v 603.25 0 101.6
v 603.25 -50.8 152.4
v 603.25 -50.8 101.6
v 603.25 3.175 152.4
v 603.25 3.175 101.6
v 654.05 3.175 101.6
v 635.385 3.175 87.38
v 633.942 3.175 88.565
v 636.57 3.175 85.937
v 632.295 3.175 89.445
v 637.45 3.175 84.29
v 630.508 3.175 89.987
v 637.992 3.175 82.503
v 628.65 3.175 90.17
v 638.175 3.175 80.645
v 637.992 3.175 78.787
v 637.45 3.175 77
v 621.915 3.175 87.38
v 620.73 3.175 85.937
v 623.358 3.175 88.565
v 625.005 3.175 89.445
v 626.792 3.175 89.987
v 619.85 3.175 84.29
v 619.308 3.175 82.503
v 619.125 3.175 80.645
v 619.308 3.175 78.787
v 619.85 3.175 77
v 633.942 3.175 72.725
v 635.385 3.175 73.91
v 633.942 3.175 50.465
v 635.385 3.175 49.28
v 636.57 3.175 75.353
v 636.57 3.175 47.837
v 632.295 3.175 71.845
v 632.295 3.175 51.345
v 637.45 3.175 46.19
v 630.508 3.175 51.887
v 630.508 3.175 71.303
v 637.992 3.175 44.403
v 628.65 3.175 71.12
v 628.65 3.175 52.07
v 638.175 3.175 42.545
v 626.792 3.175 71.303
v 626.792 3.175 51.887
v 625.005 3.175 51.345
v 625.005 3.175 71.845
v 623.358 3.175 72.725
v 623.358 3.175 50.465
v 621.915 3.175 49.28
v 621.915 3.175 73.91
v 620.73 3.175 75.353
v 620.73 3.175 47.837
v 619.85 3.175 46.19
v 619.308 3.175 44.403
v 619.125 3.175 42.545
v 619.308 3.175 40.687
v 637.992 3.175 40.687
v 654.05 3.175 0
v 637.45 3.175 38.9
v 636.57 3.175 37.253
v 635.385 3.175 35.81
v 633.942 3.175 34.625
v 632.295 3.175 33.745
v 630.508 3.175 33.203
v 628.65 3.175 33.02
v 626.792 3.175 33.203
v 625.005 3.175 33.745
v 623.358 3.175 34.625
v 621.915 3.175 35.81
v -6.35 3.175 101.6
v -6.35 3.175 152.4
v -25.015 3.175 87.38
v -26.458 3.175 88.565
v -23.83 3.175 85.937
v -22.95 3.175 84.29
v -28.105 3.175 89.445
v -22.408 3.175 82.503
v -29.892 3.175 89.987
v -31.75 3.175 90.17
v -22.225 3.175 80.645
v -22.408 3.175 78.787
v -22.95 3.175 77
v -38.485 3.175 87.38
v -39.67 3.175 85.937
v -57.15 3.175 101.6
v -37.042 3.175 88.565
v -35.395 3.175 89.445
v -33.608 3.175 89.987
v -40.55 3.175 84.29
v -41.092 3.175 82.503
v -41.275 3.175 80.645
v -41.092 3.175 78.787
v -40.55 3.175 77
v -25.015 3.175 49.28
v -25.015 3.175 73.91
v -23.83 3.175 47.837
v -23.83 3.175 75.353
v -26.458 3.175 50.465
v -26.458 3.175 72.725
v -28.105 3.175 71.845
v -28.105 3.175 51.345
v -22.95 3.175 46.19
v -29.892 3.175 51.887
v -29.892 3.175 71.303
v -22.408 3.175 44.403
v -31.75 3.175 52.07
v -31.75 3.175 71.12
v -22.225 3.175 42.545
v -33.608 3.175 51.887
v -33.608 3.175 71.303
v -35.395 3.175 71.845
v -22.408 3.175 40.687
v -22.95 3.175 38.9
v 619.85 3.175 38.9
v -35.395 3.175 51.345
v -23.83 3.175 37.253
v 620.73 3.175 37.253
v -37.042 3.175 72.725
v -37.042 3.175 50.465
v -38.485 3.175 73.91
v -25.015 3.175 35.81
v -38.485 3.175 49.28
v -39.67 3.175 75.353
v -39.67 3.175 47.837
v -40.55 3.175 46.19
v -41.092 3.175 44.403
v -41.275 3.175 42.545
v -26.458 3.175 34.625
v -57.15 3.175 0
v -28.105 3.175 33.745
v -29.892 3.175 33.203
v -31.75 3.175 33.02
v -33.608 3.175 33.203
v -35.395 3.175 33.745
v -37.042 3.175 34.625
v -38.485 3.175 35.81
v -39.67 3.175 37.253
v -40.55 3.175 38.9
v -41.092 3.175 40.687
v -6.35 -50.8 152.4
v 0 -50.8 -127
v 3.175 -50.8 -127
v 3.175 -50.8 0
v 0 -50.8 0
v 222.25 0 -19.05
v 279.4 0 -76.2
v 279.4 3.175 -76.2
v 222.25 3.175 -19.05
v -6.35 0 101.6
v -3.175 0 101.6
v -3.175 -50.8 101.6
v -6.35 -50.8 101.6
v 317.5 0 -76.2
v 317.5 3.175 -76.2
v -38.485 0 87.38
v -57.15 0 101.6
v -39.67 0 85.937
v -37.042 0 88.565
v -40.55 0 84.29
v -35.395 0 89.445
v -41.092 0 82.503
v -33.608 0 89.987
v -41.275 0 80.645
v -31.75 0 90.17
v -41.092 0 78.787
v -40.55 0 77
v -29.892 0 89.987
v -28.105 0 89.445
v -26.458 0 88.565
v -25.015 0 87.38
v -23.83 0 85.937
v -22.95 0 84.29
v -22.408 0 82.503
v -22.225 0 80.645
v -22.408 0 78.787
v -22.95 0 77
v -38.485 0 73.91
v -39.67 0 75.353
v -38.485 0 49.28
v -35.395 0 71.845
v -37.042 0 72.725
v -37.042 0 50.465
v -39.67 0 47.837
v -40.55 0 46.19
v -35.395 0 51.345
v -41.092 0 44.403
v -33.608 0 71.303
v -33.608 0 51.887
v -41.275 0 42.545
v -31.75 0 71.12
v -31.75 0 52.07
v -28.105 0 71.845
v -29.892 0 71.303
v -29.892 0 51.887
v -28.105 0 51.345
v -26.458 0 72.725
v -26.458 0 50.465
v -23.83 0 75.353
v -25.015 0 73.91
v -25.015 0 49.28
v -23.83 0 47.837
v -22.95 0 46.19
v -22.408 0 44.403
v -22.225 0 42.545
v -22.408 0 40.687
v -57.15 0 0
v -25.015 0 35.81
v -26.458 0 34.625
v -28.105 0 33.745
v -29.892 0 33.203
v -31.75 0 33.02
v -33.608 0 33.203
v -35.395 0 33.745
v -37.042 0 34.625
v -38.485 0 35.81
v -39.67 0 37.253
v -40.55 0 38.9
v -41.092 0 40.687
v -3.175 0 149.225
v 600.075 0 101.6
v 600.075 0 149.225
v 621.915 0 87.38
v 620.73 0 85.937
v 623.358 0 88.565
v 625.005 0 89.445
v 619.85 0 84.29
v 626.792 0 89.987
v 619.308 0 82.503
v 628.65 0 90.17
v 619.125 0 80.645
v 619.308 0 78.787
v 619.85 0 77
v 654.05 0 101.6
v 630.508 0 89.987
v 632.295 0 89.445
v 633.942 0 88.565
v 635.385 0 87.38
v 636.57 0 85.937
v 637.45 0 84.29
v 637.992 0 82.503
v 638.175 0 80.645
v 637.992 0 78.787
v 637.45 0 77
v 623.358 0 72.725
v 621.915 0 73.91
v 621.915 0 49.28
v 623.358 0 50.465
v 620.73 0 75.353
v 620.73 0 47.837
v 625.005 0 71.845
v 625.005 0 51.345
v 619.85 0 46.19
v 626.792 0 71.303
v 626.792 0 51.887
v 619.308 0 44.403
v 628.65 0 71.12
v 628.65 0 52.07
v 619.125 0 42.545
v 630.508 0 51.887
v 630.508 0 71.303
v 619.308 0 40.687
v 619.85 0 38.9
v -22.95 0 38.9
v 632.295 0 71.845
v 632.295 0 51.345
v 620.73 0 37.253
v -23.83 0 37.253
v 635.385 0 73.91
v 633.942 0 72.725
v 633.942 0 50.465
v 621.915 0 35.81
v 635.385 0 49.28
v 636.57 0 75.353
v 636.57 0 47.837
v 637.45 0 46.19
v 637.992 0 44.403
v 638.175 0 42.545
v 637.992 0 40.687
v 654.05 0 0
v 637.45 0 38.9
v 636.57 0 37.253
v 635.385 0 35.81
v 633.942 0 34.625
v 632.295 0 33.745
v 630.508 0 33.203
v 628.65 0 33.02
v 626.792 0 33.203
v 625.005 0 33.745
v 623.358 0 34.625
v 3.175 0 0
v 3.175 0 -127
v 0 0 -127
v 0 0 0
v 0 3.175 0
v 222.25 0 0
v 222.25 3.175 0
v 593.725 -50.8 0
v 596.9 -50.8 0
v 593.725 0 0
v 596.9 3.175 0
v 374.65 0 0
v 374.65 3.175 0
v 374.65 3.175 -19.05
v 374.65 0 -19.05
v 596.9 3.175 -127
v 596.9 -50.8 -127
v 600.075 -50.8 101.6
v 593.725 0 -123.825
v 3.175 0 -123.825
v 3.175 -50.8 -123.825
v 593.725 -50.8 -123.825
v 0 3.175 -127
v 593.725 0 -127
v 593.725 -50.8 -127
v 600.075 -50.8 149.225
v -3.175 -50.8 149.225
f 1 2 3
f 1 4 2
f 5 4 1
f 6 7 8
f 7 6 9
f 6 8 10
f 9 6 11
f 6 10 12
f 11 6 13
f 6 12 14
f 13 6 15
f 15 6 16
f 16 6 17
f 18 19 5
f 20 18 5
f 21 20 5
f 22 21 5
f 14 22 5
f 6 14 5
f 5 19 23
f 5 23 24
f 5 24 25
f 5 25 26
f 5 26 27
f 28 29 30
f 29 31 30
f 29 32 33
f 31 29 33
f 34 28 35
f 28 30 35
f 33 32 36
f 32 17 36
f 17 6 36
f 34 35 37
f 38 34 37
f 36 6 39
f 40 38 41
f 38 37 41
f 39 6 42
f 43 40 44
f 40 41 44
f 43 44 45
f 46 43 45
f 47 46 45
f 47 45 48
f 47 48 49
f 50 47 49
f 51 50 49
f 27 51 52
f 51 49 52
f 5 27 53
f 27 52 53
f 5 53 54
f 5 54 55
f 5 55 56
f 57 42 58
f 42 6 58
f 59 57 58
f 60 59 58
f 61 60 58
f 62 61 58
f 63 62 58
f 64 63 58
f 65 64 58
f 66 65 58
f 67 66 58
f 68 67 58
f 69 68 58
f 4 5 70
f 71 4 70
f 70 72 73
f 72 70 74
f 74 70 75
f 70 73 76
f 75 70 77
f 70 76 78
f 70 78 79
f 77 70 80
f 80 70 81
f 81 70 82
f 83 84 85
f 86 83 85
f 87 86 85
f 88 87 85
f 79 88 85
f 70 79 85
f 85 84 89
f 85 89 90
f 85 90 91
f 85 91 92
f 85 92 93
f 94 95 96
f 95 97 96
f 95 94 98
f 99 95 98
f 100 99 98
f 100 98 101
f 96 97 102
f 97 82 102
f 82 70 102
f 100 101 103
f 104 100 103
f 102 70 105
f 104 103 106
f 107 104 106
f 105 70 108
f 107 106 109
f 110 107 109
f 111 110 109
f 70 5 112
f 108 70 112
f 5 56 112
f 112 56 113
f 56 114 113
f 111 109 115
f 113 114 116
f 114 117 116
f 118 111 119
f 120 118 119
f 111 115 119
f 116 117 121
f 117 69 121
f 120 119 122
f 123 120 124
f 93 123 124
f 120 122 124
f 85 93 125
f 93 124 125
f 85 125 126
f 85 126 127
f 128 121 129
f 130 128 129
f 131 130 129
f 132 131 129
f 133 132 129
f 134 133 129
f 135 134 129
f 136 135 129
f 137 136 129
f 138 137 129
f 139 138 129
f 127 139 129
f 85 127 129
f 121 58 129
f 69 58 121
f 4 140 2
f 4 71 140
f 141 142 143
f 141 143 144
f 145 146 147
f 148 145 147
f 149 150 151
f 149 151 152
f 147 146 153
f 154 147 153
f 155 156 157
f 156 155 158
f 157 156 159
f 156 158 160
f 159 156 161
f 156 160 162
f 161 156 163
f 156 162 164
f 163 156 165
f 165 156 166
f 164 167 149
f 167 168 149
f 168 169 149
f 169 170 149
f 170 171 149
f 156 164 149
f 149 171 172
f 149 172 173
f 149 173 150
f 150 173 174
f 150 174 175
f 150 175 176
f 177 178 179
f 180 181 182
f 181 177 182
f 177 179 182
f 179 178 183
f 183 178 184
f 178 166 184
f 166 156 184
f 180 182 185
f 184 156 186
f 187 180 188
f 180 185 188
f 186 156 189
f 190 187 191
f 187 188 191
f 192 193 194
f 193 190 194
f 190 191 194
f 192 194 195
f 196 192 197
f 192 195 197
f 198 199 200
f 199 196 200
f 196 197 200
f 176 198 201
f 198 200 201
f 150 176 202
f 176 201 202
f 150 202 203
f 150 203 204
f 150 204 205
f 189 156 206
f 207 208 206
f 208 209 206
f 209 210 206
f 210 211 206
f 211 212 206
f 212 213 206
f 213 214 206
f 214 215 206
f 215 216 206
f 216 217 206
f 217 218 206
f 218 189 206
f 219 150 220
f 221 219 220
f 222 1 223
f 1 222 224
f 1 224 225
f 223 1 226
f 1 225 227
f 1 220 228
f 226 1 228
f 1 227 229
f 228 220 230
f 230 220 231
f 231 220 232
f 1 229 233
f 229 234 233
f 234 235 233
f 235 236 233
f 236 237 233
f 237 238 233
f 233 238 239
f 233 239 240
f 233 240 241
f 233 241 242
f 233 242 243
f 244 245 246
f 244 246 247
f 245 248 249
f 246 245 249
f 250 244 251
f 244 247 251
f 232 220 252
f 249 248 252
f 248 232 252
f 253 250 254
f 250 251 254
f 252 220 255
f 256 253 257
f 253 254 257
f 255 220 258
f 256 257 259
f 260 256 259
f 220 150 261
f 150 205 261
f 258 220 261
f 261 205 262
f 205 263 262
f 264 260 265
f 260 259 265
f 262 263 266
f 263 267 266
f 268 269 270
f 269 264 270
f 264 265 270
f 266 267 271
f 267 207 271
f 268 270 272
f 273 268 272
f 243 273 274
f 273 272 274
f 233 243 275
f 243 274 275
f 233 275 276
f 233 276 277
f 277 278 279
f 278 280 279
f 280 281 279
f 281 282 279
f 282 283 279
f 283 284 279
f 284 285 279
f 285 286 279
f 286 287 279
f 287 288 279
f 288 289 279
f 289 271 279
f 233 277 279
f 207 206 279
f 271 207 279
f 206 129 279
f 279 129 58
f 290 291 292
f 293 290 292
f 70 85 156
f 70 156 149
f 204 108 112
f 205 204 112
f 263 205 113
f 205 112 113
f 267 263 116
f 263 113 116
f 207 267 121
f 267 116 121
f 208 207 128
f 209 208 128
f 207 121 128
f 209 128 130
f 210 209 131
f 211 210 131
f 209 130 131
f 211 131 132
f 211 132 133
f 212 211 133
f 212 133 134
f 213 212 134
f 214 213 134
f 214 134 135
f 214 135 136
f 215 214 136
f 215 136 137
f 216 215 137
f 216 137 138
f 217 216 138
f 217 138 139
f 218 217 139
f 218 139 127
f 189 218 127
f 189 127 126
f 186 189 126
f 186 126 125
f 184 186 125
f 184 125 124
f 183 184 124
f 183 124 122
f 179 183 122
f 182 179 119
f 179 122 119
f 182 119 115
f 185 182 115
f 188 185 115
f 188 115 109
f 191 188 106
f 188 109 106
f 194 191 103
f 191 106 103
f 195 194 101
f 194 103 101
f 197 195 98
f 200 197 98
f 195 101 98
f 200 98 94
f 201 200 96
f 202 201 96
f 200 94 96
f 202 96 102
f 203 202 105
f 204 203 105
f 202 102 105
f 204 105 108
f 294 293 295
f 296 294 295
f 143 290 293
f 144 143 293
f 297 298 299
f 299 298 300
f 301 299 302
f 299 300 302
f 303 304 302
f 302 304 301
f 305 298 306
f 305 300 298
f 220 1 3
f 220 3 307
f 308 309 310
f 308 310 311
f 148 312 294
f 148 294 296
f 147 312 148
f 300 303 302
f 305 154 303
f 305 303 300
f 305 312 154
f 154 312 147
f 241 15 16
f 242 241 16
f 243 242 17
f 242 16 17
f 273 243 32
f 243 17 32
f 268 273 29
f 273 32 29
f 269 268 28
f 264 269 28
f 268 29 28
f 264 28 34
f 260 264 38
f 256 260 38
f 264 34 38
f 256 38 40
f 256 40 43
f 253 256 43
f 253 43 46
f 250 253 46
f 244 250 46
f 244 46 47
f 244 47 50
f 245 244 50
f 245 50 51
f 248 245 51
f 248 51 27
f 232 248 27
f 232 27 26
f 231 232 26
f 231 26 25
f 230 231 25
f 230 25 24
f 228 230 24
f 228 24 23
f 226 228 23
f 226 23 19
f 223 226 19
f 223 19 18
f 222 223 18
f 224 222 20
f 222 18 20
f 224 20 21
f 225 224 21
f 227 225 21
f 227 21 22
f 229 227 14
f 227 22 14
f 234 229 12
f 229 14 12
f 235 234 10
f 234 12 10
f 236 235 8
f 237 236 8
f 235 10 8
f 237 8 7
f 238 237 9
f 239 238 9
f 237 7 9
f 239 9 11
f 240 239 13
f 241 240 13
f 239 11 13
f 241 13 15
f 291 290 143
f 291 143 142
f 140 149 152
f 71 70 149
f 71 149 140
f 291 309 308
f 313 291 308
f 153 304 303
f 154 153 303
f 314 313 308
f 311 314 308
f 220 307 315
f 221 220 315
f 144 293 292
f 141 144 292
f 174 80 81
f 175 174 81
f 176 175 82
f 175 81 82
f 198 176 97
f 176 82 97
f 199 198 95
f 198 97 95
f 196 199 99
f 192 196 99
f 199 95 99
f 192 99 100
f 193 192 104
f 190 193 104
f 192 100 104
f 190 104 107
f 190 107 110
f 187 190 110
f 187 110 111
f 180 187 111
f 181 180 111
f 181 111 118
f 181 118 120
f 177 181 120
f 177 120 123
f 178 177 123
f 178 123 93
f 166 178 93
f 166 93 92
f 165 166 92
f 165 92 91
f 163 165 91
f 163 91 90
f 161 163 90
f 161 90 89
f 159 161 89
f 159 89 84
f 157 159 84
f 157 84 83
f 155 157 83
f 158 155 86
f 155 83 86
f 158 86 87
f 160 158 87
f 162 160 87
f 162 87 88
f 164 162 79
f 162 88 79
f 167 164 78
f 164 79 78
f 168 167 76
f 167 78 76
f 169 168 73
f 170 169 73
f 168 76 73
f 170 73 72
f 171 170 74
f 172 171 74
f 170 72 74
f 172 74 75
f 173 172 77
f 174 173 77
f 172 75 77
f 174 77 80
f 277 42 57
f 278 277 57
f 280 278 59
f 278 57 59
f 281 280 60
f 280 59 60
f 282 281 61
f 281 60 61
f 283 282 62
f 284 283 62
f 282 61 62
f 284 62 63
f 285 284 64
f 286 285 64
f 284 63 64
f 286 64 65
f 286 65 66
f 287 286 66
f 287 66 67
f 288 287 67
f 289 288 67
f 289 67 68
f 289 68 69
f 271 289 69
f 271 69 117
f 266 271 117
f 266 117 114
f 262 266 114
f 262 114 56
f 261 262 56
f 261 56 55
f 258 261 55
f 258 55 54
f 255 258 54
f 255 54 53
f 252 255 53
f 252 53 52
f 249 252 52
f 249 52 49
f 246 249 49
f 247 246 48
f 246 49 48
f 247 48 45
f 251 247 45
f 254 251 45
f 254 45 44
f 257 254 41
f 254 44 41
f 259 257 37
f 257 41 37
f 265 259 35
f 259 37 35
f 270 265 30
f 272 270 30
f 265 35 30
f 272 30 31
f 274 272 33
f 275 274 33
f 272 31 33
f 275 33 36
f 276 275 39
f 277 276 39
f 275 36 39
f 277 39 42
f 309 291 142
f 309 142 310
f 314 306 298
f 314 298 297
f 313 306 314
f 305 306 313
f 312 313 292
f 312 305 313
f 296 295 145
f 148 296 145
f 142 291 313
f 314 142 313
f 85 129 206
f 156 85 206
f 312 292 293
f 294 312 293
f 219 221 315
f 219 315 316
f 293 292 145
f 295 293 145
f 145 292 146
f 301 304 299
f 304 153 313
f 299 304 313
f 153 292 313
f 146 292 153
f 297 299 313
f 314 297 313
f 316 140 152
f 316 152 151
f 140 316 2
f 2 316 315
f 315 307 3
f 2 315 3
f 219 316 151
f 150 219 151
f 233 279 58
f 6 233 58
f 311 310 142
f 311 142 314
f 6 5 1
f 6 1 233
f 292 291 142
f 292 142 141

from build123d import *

# Parameters (mm, degrees)
BOSS_EXTRUDE1_DEPTH = 3.175
CHAMFER1_SIZE       = 57.15
SKETCH2_W           = 3.175
SKETCH2_H           = 127
BOSS_EXTRUDE2_DEPTH = 50.8
SKETCH3_W           = 3.175
SKETCH3_H           = 127
BOSS_EXTRUDE3_DEPTH = 50.8
BOSS_EXTRUDE4_DEPTH = 101.6
SKETCH5_W           = 609.6
SKETCH5_H           = 3.175
BOSS_EXTRUDE5_DEPTH = 50.8
BOSS_EXTRUDE6_DEPTH = 50.8
SKETCH7_W           = 590.55
SKETCH7_H           = 3.175
BOSS_EXTRUDE7_DEPTH = 50.8
SKETCH8_R           = 9.525
CUT_EXTRUDE1_DEPTH  = 54.975


with BuildPart() as part:
    # Sketch1 → Boss-Extrude1 (new body)
    with BuildSketch(Plane(origin=(0, 0, 0), x_dir=(1, 0, 0), z_dir=(0, 1, 0))):
        Polygon((222.25, 0), (222.25, 76.2), (374.65, 76.2), (374.65, 0), (596.9, 0), (596.9, 127), (0, 127), (0, 0), align=None)
    extrude(amount=BOSS_EXTRUDE1_DEPTH)

    # Chamfer1
    chamfer1_edges = [part.edges().sort_by_distance(p)[0] for p in [
        (374.65, 1.5875, -76.2),
        (222.25, 1.5875, -76.2),
    ]]
    chamfer(chamfer1_edges, length=CHAMFER1_SIZE)

    # Sketch3 → Boss-Extrude3 (add)
    with BuildSketch(Plane(origin=(0, 0, 0), x_dir=(-1, 0, 0), z_dir=(0, -1, 0))):
        with Locations((-595.3125, 63.5)):
            Rectangle(SKETCH3_W, SKETCH3_H)
    extrude(amount=BOSS_EXTRUDE3_DEPTH)


with BuildPart() as body_2:
    # Sketch2 → Boss-Extrude2 (new body)
    with BuildSketch(Plane(origin=(0, 0, 0), x_dir=(-1, 0, 0), z_dir=(0, -1, 0))):
        with Locations((-1.5875, 63.5)):
            Rectangle(SKETCH2_W, SKETCH2_H)
    extrude(amount=BOSS_EXTRUDE2_DEPTH)


with BuildPart() as body_3:
    # Sketch4 → Boss-Extrude4 (new body)
    with BuildSketch(Plane.XY):
        Polygon((0, 3.175), (-57.15, 3.175), (-57.15, 0), (0, 0), (596.9, 0), (654.05, 0), (654.05, 3.175), (596.9, 3.175), align=None)
    extrude(amount=BOSS_EXTRUDE4_DEPTH)



with BuildPart() as body_4:
    # Sketch5 → Boss-Extrude5 (new body)
    with BuildSketch(Plane.XY.offset(101.6)):
        with Locations((298.45, 1.5875)):
            Rectangle(SKETCH5_W, SKETCH5_H)
    extrude(amount=BOSS_EXTRUDE5_DEPTH)


with BuildPart() as body_3_1:
    add(body_3.part)

    add(body_4.part)  # Boss-Extrude6 merges body 4
    # Sketch6 → Boss-Extrude6 (add)
    with BuildSketch(Plane(origin=(0, 0, 0), x_dir=(-1, 0, 0), z_dir=(0, -1, 0))):
        Polygon((-603.25, -101.6), (-600.075, -101.6), (-600.075, -149.225), (3.175, -149.225), (3.175, -101.6), (6.35, -101.6), (6.35, -152.4), (-603.25, -152.4), align=None)
    extrude(amount=BOSS_EXTRUDE6_DEPTH)

    # Sketch8 → Cut-Extrude1 (cut, through all)
    with BuildSketch(Plane(origin=(0, 3.175, 0), x_dir=(1, 0, 0), z_dir=(0, 1, 0))):
        with Locations((-31.75, -80.645)):
            Circle(SKETCH8_R)
        with Locations((-31.75, -42.545)):
            Circle(SKETCH8_R)
        with Locations((628.65, -42.545)):
            Circle(SKETCH8_R)
        with Locations((628.65, -80.645)):
            Circle(SKETCH8_R)
    extrude(amount=-CUT_EXTRUDE1_DEPTH, mode=Mode.SUBTRACT)


with BuildPart() as body_4_2:
    # Sketch7 → Boss-Extrude7 (new body)
    with BuildSketch(Plane.XZ):
        with Locations((298.45, -125.4125)):
            Rectangle(SKETCH7_W, SKETCH7_H)
    extrude(amount=BOSS_EXTRUDE7_DEPTH)


solid = Compound([part.part, body_2.part, body_3_1.part, body_4_2.part])
